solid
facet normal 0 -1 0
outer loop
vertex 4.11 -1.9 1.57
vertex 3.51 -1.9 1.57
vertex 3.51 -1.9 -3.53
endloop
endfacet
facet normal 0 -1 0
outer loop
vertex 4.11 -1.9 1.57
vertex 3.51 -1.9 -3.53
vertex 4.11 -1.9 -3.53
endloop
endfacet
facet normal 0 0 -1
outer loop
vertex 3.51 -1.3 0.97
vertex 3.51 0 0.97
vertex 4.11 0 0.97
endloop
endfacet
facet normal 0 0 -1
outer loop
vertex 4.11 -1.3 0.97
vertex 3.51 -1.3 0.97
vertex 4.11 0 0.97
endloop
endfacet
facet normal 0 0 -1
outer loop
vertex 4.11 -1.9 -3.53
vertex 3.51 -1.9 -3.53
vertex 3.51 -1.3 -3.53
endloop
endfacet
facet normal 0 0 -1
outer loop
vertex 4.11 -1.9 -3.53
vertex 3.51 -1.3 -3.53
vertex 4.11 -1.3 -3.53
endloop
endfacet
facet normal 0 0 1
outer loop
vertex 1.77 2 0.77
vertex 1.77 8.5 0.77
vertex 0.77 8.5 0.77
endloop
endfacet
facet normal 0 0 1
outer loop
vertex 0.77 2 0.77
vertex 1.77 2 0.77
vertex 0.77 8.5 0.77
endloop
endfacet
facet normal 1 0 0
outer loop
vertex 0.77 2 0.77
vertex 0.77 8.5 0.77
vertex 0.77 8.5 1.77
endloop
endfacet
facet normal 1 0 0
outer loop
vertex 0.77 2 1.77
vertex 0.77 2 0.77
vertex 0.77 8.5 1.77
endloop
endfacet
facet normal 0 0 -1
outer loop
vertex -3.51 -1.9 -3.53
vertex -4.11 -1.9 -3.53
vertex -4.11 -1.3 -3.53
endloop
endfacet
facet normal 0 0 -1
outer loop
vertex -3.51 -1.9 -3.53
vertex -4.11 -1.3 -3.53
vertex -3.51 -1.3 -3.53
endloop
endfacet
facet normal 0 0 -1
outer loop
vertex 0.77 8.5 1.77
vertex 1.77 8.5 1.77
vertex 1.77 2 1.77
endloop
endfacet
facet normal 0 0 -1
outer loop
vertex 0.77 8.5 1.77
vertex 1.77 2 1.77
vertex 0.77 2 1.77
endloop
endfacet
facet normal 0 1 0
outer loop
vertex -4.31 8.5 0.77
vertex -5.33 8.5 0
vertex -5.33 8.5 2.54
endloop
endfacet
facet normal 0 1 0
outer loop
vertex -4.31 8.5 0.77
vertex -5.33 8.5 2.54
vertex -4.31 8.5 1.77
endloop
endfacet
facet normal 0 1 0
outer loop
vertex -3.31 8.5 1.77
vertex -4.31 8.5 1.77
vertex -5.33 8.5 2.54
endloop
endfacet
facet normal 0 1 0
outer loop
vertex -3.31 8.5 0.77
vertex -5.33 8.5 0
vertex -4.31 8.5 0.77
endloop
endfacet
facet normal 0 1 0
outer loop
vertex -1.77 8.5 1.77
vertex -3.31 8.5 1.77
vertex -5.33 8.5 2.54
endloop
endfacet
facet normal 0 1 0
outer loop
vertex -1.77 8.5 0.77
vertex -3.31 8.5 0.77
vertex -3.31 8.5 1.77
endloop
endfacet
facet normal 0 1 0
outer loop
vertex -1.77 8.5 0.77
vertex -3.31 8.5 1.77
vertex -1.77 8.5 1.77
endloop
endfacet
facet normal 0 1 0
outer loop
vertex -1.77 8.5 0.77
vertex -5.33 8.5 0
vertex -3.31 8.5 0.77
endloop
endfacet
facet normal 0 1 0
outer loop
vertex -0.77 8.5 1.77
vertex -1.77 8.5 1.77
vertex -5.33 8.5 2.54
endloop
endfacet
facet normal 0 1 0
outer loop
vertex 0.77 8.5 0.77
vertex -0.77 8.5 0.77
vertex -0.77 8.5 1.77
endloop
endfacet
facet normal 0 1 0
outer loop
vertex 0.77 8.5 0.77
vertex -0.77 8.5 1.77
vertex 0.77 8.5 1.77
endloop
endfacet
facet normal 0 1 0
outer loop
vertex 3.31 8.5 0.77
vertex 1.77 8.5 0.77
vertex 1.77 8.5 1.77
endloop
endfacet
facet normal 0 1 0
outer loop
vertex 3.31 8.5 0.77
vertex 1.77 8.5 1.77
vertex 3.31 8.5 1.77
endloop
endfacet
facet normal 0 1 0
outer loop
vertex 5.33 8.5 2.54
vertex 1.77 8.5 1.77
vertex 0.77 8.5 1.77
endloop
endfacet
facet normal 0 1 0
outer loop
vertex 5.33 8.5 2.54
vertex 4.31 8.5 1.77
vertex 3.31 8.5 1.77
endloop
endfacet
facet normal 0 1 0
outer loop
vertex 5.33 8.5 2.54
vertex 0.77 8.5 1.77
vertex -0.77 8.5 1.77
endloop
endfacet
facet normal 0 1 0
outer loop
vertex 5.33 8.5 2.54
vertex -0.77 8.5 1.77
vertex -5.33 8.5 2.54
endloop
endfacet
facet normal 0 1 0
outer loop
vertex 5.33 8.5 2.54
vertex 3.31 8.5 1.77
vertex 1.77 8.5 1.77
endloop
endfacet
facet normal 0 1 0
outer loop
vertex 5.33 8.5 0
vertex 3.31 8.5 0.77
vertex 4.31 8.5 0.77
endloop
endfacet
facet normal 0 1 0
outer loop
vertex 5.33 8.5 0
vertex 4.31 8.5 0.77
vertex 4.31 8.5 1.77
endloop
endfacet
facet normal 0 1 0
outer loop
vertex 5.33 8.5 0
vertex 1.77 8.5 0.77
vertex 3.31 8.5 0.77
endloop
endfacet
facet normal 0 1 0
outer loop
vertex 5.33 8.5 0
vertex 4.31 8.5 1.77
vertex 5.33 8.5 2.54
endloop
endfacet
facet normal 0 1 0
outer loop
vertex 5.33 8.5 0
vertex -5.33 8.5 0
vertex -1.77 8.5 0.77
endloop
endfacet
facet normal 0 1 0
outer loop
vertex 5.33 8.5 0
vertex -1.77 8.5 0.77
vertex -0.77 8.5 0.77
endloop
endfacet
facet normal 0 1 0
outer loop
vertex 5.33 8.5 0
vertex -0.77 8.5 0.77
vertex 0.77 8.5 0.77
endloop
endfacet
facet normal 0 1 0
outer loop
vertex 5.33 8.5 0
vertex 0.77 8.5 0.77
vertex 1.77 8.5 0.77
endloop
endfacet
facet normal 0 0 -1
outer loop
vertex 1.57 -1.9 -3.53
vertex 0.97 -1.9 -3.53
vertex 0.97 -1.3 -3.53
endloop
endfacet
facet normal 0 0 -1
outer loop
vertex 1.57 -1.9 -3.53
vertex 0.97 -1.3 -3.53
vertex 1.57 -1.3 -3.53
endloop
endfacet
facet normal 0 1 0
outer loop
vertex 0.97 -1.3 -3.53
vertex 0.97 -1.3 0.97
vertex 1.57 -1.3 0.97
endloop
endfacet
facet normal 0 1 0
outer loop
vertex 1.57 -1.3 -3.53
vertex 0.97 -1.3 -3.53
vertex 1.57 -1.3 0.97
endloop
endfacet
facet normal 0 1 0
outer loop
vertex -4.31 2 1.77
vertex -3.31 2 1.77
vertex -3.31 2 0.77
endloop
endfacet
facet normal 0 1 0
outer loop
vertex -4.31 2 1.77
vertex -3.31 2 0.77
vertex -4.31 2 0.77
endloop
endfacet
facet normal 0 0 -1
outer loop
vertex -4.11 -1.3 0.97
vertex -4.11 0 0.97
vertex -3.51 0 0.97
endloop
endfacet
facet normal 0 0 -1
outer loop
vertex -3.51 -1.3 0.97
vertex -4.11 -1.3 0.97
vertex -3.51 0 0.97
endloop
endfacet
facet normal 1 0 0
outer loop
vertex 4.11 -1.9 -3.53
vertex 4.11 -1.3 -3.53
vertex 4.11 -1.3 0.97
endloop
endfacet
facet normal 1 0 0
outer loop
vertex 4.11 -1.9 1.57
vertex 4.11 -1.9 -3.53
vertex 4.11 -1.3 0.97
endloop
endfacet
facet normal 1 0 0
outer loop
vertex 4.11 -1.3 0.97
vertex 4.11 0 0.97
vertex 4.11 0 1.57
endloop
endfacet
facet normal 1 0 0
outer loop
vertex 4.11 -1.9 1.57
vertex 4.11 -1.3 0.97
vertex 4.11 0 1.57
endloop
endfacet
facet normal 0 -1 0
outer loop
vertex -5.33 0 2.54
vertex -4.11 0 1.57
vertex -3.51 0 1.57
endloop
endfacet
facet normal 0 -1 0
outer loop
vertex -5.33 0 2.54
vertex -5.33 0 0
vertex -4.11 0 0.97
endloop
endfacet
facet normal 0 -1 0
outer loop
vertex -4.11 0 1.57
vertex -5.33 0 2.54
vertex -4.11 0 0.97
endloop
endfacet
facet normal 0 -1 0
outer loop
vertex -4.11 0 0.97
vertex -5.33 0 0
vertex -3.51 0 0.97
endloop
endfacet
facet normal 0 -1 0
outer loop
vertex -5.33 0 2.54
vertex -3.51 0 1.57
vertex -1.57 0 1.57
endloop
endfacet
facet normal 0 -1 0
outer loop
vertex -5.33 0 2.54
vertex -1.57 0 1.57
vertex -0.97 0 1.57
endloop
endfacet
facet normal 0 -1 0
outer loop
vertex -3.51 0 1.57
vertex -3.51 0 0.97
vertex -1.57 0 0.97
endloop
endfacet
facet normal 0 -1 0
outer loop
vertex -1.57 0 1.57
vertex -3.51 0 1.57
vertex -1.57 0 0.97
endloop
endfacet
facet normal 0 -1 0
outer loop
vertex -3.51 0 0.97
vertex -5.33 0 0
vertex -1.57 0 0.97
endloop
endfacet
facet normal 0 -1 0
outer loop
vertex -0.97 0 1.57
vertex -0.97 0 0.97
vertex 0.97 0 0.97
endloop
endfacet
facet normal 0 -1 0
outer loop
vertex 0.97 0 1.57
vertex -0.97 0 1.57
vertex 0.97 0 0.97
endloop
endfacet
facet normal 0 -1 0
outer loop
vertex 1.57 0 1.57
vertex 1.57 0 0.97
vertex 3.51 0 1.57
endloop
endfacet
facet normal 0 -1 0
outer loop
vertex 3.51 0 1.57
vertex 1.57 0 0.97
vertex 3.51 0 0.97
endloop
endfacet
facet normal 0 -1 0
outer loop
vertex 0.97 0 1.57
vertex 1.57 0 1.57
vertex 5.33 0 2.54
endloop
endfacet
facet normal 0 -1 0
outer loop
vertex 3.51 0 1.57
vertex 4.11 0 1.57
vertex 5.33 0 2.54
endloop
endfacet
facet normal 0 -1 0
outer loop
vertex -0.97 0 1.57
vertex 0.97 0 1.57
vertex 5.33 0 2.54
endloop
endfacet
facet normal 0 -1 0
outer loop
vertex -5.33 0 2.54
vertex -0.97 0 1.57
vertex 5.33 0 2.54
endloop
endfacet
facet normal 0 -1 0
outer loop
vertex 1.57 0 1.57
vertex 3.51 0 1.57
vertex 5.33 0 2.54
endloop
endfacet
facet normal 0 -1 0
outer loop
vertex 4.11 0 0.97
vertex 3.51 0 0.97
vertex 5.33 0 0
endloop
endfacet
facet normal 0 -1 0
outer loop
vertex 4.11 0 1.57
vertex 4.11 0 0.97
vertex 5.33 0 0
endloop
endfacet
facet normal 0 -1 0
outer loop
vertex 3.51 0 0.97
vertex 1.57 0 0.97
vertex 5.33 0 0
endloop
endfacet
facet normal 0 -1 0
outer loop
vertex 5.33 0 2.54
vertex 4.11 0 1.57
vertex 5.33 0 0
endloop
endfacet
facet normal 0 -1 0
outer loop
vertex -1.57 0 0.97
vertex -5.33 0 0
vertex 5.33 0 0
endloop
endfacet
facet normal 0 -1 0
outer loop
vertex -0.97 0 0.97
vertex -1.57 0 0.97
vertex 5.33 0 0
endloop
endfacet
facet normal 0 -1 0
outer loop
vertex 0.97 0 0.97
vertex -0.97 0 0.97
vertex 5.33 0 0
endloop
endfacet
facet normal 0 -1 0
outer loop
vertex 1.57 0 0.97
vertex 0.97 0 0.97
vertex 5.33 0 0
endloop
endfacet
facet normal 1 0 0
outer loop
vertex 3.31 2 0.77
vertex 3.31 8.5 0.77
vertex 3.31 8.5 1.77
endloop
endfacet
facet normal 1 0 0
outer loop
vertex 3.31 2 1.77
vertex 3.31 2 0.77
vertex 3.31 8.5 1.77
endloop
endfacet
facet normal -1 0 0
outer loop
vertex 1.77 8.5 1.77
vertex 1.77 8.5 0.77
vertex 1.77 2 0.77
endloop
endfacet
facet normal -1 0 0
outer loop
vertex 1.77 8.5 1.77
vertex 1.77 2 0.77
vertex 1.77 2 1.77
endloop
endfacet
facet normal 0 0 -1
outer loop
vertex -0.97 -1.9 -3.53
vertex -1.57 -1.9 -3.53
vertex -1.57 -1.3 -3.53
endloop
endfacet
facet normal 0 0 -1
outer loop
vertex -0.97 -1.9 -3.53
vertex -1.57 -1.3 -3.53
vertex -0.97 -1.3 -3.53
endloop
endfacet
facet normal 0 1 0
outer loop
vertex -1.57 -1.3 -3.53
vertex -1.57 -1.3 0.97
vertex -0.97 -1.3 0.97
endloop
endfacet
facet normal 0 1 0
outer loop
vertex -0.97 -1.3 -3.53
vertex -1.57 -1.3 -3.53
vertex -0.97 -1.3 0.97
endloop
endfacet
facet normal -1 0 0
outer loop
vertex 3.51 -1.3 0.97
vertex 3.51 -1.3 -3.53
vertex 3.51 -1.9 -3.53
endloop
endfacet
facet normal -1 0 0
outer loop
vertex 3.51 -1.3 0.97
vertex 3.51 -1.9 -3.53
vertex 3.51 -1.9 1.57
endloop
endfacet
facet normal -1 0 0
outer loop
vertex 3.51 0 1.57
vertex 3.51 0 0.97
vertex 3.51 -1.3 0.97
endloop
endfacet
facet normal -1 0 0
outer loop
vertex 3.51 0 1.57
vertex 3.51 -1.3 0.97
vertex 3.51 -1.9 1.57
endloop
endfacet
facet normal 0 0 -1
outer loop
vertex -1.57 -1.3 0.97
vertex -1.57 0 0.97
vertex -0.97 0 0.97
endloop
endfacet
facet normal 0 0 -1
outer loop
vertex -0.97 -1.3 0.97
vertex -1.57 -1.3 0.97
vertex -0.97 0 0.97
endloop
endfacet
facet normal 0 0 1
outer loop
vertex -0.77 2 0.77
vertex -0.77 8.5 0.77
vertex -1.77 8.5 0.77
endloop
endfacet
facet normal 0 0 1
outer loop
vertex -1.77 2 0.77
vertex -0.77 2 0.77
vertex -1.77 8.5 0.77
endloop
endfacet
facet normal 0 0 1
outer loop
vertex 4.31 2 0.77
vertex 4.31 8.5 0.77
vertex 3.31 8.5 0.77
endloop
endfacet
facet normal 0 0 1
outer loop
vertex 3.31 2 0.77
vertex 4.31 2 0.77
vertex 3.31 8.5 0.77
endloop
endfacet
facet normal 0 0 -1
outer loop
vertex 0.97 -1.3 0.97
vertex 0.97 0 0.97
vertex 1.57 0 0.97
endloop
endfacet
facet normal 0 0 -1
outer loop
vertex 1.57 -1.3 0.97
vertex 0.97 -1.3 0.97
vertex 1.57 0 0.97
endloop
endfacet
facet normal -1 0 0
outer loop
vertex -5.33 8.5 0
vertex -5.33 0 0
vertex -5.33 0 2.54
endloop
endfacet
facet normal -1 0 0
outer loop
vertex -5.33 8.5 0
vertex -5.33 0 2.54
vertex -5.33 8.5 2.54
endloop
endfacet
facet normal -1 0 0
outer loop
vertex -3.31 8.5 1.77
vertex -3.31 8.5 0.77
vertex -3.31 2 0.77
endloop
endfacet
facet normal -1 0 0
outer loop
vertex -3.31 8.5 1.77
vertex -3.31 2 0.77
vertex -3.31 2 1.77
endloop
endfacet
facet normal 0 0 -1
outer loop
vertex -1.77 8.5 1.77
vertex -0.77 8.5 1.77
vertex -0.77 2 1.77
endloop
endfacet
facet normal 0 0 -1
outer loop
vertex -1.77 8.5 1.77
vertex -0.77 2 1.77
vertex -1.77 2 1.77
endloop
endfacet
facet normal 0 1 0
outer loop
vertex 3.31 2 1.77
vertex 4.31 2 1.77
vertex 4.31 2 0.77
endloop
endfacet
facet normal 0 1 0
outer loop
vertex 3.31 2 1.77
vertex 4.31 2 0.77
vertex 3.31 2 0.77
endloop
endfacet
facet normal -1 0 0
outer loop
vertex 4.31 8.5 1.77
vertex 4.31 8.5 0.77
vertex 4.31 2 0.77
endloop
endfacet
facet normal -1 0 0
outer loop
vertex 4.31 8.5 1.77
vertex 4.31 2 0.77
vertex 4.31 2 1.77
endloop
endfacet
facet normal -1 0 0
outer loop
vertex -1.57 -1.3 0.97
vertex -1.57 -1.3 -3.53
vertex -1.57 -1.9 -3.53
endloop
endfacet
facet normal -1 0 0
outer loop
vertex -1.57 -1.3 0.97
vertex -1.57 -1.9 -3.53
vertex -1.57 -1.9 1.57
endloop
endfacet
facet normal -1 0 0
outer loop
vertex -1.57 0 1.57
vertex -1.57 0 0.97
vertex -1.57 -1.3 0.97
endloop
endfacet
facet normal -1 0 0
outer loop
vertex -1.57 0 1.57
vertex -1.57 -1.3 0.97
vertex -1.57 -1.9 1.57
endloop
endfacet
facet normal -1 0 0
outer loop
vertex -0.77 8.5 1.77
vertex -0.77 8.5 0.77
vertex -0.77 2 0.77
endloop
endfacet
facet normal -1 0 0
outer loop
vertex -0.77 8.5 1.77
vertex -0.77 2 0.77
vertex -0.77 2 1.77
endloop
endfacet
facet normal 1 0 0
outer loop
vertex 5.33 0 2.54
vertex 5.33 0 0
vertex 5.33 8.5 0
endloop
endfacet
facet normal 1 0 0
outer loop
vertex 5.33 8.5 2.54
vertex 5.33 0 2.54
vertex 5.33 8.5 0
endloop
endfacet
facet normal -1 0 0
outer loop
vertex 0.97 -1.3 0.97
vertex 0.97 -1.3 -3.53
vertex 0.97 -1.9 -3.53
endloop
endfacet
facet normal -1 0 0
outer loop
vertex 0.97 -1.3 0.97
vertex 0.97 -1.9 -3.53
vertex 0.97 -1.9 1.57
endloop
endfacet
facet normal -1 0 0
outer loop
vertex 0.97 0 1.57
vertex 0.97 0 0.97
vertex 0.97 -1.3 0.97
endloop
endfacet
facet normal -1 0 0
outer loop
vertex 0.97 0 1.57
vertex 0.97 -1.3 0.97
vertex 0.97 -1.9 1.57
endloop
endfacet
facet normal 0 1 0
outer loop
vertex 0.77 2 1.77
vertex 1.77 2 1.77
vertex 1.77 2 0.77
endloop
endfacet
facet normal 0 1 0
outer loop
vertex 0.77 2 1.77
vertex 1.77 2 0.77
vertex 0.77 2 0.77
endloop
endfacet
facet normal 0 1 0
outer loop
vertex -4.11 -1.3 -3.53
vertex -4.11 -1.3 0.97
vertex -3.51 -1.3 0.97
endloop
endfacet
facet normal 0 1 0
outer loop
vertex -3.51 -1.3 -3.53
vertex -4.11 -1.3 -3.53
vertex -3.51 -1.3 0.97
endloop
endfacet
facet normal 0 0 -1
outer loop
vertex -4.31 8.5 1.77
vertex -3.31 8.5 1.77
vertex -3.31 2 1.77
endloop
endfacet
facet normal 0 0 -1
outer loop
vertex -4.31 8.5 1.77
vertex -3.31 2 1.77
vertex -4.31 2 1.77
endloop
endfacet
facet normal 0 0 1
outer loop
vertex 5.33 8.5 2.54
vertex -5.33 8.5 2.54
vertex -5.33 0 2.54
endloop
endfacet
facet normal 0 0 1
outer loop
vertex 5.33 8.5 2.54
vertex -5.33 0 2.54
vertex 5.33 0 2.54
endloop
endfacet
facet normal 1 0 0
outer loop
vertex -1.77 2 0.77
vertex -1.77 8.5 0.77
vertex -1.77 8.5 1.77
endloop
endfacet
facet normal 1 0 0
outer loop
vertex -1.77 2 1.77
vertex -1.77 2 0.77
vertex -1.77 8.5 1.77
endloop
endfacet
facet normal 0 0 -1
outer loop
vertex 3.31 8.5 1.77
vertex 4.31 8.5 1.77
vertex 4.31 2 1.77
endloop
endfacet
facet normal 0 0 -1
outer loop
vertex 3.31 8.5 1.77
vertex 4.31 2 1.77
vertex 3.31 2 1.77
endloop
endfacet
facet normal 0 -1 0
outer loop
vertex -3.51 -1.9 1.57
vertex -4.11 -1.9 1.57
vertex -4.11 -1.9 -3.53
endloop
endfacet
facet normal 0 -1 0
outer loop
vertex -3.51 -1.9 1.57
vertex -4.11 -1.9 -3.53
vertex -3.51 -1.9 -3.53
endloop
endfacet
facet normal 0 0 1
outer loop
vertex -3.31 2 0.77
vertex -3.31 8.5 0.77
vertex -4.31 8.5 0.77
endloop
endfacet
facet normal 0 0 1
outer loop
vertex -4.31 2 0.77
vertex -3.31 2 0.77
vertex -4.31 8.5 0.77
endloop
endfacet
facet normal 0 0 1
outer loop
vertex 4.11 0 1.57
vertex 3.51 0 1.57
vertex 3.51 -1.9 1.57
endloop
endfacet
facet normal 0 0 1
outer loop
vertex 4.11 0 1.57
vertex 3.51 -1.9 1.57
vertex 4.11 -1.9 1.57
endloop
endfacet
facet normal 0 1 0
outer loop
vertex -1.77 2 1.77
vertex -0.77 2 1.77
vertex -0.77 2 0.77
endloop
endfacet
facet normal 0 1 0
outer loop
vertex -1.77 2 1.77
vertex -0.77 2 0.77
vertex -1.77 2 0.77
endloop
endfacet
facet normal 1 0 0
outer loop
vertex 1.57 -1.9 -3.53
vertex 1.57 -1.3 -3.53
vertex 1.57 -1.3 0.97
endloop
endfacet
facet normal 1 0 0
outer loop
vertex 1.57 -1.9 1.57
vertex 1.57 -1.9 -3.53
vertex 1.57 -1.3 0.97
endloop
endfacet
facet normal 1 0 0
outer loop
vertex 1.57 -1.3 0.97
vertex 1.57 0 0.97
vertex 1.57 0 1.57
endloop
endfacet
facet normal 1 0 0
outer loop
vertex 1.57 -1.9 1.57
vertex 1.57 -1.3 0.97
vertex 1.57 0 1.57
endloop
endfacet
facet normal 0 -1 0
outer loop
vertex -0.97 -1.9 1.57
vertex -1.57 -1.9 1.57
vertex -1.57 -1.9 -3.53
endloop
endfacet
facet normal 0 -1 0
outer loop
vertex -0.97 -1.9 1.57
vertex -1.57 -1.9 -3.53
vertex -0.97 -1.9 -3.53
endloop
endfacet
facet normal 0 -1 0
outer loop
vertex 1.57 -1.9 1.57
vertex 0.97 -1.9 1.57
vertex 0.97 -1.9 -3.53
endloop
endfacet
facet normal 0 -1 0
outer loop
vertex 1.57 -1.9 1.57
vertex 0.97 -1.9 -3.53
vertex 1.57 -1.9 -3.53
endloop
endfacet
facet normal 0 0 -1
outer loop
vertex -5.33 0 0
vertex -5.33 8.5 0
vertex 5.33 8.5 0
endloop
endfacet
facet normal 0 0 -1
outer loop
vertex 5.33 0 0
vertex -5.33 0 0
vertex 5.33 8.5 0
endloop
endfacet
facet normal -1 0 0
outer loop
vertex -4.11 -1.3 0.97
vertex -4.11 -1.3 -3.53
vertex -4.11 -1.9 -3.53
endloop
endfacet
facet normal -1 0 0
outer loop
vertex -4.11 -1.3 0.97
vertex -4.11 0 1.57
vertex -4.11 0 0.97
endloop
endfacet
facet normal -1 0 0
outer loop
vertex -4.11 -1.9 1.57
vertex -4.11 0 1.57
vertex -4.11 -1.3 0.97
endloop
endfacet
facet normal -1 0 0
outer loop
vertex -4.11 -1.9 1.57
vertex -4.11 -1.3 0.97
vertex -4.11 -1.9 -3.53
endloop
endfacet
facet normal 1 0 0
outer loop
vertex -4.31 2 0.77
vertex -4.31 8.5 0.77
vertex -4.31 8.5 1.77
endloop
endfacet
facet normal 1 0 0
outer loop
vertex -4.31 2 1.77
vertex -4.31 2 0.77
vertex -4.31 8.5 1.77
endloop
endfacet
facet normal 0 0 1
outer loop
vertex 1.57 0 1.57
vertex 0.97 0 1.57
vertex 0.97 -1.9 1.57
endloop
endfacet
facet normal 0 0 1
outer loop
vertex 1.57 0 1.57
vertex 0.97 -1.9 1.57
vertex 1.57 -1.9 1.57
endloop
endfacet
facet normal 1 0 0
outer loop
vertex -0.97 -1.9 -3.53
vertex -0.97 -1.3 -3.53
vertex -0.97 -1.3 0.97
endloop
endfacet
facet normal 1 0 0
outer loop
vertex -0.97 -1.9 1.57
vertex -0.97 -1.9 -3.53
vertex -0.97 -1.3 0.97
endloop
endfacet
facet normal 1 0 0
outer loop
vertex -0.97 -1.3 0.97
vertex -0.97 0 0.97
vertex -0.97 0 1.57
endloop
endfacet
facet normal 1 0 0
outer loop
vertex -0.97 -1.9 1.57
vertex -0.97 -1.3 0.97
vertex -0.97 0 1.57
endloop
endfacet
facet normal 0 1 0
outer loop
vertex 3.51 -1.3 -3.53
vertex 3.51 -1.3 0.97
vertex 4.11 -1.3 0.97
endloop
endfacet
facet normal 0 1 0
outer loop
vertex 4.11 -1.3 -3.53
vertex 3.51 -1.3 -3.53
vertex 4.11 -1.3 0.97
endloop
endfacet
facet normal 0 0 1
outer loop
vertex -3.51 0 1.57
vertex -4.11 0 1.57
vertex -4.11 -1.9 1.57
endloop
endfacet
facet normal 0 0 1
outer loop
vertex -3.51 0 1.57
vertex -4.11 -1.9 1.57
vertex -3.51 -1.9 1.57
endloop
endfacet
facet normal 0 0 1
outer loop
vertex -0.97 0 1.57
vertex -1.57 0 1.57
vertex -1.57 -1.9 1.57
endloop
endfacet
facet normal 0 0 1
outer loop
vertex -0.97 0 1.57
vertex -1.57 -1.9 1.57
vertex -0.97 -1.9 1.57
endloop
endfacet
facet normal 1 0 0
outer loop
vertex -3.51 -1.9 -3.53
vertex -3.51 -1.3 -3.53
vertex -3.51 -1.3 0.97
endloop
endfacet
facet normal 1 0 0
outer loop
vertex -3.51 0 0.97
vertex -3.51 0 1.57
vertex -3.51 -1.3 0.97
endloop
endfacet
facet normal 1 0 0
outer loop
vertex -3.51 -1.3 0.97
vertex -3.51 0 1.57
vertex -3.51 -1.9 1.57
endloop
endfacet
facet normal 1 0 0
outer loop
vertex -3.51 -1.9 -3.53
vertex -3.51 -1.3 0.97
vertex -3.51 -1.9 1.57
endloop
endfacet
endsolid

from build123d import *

# Parameters (mm, degrees)
SKETCH_W     = 10.66
SKETCH_H     = 8.5
PAD_DEPTH    = 2.54
SKETCH001_W  = 1
SKETCH001_H  = 1
POCKET_DEPTH = 6.5
SKETCH002_W  = 0.6
SKETCH002_H  = 0.6
PAD001_DEPTH = 1.9
SKETCH003_W  = 0.6
SKETCH003_H  = 0.6
PAD002_DEPTH = 4.5


with BuildPart() as part:
    # Sketch → Pad (new body)
    with BuildSketch(Plane.XY):
        with Locations((0, 4.25)):
            Rectangle(SKETCH_W, SKETCH_H)
    extrude(amount=PAD_DEPTH)

    # Sketch001 → Pocket (cut)
    with BuildSketch(Plane(origin=(0, 8.5, 0), x_dir=(-1, 0, 0), z_dir=(0, 1, 0))):
        with Locations((-3.81, 1.27)):
            Rectangle(SKETCH001_W, SKETCH001_H)
        with Locations((-1.27, 1.27)):
            Rectangle(SKETCH001_W, SKETCH001_H)
        with Locations((1.27, 1.27)):
            Rectangle(SKETCH001_W, SKETCH001_H)
        with Locations((3.81, 1.27)):
            Rectangle(SKETCH001_W, SKETCH001_H)
    extrude(amount=-POCKET_DEPTH, mode=Mode.SUBTRACT)

    # Sketch002 → Pad001 (new body)
    with BuildSketch(Plane.XZ):
        with Locations((-3.81, 1.27)):
            Rectangle(SKETCH002_W, SKETCH002_H)
        with Locations((-1.27, 1.27)):
            Rectangle(SKETCH002_W, SKETCH002_H)
        with Locations((1.27, 1.27)):
            Rectangle(SKETCH002_W, SKETCH002_H)
        with Locations((3.81, 1.27)):
            Rectangle(SKETCH002_W, SKETCH002_H)
    extrude(amount=PAD001_DEPTH)

    # Sketch003 → Pad002 (new body)
    with BuildSketch(Plane(origin=(0, 0, 0.97), x_dir=(1, 0, 0), z_dir=(0, 0, -1))):
        with Locations((-3.81, 1.6)):
            Rectangle(SKETCH003_W, SKETCH003_H)
        with Locations((-1.27, 1.6)):
            Rectangle(SKETCH003_W, SKETCH003_H)
        with Locations((1.27, 1.6)):
            Rectangle(SKETCH003_W, SKETCH003_H)
        with Locations((3.81, 1.6)):
            Rectangle(SKETCH003_W, SKETCH003_H)
    extrude(amount=PAD002_DEPTH)


solid = part.part
